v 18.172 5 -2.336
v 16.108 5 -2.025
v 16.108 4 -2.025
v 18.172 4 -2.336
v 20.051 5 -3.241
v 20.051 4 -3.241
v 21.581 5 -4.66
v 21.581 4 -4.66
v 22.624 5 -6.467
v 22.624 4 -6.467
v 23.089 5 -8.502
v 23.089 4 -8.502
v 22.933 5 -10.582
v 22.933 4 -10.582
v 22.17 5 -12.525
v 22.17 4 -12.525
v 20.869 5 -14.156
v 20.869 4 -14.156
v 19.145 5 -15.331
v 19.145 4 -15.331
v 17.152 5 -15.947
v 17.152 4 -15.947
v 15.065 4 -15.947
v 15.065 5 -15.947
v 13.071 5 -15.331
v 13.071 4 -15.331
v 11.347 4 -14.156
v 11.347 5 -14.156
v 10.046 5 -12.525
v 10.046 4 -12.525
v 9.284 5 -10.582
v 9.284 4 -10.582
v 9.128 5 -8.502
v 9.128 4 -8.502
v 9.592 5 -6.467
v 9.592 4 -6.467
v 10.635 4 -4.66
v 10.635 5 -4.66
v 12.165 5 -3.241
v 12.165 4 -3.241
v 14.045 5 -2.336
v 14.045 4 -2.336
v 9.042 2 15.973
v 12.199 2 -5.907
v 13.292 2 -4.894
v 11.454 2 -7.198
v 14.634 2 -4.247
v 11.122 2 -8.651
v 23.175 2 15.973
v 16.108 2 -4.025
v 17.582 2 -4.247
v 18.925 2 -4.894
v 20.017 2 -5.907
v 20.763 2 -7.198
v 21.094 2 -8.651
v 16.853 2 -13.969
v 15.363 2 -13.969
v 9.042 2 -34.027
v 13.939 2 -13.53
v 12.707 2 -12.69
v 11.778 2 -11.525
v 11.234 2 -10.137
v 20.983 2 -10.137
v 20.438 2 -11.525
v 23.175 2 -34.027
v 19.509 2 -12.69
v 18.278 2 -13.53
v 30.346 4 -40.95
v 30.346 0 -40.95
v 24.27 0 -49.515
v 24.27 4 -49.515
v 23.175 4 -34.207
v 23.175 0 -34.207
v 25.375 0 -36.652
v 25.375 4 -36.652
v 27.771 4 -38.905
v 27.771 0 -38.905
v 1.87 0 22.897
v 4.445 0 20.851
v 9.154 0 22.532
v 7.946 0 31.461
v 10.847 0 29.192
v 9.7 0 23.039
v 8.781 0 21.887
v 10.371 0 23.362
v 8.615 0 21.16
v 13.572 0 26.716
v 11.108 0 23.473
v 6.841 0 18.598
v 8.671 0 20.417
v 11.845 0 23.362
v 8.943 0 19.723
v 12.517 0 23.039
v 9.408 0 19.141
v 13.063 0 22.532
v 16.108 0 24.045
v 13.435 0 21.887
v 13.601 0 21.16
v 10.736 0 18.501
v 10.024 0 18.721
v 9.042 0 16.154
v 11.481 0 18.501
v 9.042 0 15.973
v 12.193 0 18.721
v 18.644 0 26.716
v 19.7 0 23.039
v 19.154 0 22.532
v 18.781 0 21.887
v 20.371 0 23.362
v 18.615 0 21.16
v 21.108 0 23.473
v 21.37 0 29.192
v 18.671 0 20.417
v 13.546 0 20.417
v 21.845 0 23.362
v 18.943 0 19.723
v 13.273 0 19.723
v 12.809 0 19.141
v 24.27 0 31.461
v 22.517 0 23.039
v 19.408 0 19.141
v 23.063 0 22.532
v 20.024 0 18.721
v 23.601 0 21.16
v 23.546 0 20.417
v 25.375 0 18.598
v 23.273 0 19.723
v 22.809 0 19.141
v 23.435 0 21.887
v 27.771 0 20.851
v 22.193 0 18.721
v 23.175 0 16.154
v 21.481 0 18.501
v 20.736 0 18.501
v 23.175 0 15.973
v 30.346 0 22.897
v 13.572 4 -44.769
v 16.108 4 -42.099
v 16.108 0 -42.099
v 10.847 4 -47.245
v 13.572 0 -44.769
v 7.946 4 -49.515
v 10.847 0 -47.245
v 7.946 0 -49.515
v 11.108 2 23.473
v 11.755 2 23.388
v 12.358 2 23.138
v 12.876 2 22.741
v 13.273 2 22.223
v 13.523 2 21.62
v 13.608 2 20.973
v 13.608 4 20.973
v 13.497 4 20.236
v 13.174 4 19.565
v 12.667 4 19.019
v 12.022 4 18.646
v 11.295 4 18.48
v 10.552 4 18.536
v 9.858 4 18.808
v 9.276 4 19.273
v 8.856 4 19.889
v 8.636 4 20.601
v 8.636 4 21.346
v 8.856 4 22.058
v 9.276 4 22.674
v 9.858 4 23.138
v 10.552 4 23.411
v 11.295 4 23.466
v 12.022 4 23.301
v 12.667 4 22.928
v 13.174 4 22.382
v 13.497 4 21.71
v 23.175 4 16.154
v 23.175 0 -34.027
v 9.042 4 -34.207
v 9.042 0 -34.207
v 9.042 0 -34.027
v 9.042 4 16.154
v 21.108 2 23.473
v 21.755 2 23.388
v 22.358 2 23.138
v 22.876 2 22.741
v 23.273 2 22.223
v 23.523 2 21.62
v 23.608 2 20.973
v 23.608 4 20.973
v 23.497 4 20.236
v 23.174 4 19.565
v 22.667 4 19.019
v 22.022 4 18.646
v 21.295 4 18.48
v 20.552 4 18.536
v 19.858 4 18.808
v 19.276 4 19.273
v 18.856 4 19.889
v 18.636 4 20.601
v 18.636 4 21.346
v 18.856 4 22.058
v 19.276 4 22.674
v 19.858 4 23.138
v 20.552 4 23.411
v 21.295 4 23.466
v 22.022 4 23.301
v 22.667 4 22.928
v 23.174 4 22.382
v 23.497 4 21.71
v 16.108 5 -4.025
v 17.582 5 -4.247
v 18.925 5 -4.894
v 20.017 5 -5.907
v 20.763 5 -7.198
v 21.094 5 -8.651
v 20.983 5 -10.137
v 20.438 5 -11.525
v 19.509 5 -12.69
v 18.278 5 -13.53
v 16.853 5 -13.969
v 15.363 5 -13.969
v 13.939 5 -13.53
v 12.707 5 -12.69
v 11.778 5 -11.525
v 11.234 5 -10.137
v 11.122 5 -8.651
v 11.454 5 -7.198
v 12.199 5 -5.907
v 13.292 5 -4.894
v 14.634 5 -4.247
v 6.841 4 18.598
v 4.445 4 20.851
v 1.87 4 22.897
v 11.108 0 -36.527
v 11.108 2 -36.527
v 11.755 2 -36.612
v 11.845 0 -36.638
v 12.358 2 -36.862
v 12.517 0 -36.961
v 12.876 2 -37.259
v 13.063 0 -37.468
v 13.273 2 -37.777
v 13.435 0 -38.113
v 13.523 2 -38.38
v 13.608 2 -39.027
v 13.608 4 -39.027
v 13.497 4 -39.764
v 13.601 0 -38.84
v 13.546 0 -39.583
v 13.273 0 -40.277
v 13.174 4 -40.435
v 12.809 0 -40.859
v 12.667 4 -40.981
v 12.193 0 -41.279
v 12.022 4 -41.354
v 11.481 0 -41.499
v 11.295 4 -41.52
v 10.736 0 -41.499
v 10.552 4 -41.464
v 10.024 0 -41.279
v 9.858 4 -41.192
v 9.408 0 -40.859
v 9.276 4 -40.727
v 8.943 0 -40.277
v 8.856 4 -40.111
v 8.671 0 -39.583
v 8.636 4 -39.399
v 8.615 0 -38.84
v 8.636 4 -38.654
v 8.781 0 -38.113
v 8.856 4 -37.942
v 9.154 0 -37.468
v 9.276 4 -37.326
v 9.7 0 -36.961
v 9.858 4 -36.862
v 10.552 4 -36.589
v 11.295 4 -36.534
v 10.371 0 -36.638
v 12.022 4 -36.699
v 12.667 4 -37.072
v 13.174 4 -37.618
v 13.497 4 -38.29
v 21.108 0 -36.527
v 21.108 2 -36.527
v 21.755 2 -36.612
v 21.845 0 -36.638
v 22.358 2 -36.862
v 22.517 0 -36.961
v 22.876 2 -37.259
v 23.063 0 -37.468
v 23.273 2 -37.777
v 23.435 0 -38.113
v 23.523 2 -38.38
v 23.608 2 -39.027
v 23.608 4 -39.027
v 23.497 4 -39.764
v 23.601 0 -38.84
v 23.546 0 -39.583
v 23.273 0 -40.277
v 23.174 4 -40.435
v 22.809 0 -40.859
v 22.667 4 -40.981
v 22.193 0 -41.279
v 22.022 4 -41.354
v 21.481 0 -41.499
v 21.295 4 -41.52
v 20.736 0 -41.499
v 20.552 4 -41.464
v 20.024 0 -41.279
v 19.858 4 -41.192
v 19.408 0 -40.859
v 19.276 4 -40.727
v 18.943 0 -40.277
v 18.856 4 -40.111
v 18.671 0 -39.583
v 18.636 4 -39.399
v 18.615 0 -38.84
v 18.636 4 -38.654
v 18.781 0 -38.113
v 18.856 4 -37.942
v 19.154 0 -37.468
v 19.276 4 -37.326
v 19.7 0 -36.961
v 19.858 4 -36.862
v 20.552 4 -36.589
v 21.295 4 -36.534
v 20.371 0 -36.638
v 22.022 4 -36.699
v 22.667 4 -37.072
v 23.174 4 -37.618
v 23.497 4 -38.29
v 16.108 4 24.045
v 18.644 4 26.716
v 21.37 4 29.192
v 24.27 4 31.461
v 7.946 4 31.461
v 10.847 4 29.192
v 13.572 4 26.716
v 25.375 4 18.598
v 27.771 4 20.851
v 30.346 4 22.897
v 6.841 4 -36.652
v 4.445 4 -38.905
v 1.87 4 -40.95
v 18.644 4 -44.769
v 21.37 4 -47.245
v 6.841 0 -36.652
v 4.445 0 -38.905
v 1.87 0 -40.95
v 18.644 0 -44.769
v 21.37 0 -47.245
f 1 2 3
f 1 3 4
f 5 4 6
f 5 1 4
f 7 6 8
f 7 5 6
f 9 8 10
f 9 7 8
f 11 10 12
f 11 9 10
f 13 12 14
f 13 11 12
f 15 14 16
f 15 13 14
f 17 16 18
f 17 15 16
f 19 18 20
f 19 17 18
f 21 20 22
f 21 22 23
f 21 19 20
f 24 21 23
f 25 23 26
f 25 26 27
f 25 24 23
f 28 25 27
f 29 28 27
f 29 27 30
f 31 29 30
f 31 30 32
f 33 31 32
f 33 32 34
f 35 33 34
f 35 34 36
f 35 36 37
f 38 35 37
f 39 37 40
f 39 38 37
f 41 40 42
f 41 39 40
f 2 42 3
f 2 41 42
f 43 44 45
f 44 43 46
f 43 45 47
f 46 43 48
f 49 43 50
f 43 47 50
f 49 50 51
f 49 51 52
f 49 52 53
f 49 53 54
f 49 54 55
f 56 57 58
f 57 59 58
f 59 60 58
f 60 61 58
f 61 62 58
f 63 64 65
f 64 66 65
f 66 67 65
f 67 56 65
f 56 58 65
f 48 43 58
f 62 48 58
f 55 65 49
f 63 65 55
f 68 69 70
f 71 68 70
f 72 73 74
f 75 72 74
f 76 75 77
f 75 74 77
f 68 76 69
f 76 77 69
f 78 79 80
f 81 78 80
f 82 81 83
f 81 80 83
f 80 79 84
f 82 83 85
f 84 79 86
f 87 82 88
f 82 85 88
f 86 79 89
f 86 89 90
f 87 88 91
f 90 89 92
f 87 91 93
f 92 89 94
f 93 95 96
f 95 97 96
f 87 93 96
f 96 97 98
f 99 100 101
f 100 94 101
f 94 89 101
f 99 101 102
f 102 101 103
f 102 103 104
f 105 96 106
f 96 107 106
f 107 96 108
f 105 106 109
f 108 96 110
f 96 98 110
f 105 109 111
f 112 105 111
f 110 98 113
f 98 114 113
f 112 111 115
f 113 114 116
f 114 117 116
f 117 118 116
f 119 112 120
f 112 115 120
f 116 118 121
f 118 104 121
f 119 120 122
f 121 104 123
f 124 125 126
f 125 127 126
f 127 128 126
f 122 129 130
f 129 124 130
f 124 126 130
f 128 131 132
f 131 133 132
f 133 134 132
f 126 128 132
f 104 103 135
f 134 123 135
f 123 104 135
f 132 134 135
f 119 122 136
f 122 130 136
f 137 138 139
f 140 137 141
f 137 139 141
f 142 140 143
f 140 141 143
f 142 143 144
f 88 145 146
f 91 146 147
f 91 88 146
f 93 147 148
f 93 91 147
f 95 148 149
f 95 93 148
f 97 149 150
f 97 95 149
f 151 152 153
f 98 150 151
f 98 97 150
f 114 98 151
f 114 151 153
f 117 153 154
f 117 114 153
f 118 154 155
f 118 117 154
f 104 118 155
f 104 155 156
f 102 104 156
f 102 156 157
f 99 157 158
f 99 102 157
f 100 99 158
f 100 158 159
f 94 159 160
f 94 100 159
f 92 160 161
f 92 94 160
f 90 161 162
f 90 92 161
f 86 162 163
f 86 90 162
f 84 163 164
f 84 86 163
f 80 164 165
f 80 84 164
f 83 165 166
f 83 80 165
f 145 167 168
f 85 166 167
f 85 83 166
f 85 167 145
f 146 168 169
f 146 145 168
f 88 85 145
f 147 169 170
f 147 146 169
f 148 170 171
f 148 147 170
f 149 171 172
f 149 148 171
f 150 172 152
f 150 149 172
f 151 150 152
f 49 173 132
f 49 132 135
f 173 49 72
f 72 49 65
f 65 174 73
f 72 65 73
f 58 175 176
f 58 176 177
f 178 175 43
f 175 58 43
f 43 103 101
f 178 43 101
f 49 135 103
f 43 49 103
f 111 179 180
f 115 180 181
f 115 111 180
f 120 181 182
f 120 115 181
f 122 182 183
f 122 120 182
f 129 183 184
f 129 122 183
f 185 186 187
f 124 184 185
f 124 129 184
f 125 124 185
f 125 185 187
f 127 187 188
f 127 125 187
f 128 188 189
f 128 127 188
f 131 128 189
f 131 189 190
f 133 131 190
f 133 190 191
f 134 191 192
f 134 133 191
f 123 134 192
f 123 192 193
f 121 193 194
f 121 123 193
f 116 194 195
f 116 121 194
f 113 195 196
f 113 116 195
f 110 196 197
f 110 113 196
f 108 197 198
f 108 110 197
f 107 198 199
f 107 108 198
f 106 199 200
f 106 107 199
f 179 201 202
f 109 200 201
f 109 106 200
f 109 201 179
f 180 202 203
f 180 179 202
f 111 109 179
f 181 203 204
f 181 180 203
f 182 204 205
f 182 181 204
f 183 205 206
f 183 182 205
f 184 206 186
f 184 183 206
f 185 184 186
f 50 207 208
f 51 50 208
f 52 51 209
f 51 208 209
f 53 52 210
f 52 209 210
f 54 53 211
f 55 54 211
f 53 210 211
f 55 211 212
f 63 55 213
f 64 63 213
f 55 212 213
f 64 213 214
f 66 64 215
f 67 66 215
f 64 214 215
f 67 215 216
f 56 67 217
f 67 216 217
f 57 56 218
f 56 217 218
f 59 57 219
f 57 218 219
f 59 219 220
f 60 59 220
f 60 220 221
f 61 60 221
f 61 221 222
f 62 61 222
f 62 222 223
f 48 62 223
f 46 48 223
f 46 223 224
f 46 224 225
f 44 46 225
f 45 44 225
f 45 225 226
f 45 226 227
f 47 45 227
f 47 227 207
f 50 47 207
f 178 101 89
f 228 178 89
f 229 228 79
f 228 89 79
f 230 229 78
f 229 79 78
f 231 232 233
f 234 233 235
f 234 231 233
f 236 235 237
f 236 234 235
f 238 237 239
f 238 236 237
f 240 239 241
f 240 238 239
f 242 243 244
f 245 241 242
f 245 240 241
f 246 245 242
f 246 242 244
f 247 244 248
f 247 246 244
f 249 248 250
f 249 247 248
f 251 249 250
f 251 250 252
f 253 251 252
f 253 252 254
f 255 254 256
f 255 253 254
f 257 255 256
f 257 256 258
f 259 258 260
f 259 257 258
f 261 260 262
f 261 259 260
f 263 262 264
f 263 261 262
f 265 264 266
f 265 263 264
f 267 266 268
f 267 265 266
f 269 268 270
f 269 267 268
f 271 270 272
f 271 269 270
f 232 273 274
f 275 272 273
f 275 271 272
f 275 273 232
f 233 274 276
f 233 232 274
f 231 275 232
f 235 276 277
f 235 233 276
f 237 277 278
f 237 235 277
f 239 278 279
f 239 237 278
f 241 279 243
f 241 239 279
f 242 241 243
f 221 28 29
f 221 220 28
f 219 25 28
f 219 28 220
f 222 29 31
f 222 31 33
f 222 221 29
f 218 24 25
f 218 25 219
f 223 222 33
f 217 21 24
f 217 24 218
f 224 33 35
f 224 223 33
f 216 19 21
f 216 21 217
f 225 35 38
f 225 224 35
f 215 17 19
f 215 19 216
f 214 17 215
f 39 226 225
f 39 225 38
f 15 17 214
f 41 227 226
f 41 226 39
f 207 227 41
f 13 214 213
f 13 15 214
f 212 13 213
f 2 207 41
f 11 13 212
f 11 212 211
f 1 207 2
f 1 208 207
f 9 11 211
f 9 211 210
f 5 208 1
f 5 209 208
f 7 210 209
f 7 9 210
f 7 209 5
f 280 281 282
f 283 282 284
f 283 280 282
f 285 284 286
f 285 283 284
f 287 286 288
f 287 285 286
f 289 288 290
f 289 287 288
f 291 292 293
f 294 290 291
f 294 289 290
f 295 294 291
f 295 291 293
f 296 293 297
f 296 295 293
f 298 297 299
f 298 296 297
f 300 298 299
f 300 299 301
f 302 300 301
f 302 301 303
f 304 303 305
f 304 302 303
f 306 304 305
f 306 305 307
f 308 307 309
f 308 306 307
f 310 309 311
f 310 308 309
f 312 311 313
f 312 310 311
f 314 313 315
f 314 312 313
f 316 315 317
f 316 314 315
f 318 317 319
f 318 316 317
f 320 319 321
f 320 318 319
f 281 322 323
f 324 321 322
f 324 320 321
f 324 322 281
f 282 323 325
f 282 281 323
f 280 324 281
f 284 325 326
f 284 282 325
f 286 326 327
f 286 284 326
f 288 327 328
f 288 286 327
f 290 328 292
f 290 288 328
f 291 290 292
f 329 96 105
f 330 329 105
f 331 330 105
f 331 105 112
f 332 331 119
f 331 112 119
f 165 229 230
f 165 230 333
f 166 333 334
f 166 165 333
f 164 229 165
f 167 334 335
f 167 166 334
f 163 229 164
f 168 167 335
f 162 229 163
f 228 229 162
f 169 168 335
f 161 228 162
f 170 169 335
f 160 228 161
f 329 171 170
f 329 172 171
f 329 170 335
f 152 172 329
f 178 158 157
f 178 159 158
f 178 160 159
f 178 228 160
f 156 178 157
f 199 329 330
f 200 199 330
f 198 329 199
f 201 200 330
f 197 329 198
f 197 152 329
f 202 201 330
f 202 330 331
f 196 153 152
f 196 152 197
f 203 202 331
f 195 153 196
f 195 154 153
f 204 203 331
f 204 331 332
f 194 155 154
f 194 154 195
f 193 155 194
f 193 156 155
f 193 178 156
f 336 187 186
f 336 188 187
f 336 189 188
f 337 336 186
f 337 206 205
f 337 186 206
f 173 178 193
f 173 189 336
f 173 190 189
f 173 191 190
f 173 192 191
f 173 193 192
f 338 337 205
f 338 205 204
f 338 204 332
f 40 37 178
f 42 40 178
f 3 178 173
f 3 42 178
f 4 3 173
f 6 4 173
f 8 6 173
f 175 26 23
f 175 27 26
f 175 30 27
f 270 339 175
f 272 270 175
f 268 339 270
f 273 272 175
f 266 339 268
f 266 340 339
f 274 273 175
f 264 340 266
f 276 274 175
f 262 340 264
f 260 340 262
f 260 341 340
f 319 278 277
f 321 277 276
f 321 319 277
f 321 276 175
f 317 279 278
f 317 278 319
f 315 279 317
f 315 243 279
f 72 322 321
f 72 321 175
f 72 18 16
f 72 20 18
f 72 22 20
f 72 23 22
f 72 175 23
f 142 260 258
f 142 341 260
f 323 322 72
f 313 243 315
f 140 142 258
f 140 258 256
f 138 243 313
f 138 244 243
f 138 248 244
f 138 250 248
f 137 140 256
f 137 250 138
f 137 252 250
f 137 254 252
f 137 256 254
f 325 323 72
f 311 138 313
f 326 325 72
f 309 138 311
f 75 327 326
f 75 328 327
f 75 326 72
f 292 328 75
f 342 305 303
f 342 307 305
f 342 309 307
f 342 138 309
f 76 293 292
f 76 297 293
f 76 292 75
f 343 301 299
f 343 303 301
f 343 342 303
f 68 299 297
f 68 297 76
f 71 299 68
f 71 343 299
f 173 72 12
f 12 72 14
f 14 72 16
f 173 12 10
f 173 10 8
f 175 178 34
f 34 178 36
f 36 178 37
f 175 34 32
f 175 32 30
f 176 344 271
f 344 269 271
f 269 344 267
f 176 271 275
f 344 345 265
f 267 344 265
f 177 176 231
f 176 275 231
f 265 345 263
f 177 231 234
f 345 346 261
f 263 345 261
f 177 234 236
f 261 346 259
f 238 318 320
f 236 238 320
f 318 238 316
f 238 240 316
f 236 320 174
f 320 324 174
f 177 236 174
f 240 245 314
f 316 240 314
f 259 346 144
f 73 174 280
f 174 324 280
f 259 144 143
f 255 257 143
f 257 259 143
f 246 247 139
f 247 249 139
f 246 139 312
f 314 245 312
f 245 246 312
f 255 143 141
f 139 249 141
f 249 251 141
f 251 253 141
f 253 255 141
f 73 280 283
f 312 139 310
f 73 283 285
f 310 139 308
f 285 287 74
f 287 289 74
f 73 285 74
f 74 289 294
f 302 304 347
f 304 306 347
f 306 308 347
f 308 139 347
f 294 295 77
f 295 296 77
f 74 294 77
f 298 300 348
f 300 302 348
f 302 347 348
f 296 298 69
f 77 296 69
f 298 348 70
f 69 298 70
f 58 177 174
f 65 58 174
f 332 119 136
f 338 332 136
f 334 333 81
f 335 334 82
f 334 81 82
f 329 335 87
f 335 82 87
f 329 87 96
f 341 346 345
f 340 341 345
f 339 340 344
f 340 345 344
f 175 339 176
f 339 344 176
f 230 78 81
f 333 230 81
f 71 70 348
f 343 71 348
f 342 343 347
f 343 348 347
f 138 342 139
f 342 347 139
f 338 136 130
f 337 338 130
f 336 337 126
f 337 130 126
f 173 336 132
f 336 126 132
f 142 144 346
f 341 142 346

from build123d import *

# Parameters (mm, degrees)
SKETCH1_R               = 2.5
BOSS_EXTRUDE1_DEPTH     = 2
BOSS_EXTRUDE1_2_DEPTH   = 2
BOSS_EXTRUDE3_OUTLINE_R = 2.5
BOSS_EXTRUDE3_DEPTH     = 2
SKETCH6_R               = 5
CUT_EXTRUDE1_DEPTH      = 4
CUT_EXTRUDE2_START      = -10
CUT_EXTRUDE2_DEPTH      = 10
BOSS_EXTRUDE4_START     = 1
SKETCH8_R               = 7
SKETCH8_R_2             = 5
BOSS_EXTRUDE4_DEPTH     = 1


# Read off the part's stored shape, not the designer's step: Boss-Extrude3
with BuildPart() as part:
    # Sketch1 → Boss-Extrude1 (new body)
    with BuildSketch(Plane(origin=(0, 0, 0), x_dir=(1, 0, 0), z_dir=(0, 1, 0))):
        with BuildLine():
            ThreePointArc((23.674984177, 34.026642345), (27.138423224, 37.66837111), (31.041417883, 40.83447773))
            Line((31.041417883, 40.83447773), (24.387097577, 50.213711241))
            ThreePointArc((24.387097577, 50.213711241), (20.045094669, 46.759453741), (16.108243271, 42.849711395))
            ThreePointArc((16.108243271, 42.849711395), (12.171391874, 46.759453741), (7.829388966, 50.213711241))
            Line((7.829388966, 50.213711241), (1.175068659, 40.83447773))
            ThreePointArc((1.175068659, 40.83447773), (5.078063318, 37.66837111), (8.541502365, 34.026642345))
            Line((8.541502365, 34.026642345), (23.674984177, 34.026642345))
        make_face()
        with Locations(Location((11.108243271, 39.026642345, 0), (0, 0, 270))):
            Circle(SKETCH1_R, mode=Mode.SUBTRACT)
        with Locations(Location((21.108243271, 39.026642345, 0), (0, 0, 270))):
            Circle(SKETCH1_R, mode=Mode.SUBTRACT)
    extrude(amount=BOSS_EXTRUDE1_DEPTH)



with BuildPart() as body_2:
    # Sketch1 → Boss-Extrude1 2 (new body)
    with BuildSketch(Plane(origin=(0, 0, 0), x_dir=(1, 0, 0), z_dir=(0, 1, 0))):
        with BuildLine():
            Line((24.387097577, -32.160426552), (31.041417883, -22.781193041))
            ThreePointArc((31.041417883, -22.781193041), (27.138423224, -19.615086421), (23.674984177, -15.973357655))
            Line((23.674984177, -15.973357655), (8.541502365, -15.973357655))
            ThreePointArc((8.541502365, -15.973357655), (5.078063318, -19.615086421), (1.175068659, -22.781193041))
            Line((1.175068659, -22.781193041), (7.829388966, -32.160426552))
            ThreePointArc((7.829388966, -32.160426552), (12.171391874, -28.706169052), (16.108243271, -24.796426706))
            ThreePointArc((16.108243271, -24.796426706), (20.045094669, -28.706169052), (24.387097577, -32.160426552))
        make_face()
        with Locations(Location((11.108243271, -20.973357655, 0), (0, 0, 270))):
            Circle(SKETCH1_R, mode=Mode.SUBTRACT)
        with Locations(Location((21.108243271, -20.973357655, 0), (0, 0, 270))):
            Circle(SKETCH1_R, mode=Mode.SUBTRACT)
    extrude(amount=BOSS_EXTRUDE1_2_DEPTH)


with BuildPart() as part_1:
    add(part.part)

    add(body_2.part)  # Boss-Extrude3 merges body 2
    # Boss-Extrude3 outline → Boss-Extrude3 (add)
    with BuildSketch(Plane(origin=(0, 2, 0), x_dir=(1, 0, 0), z_dir=(0, 1, 0))):
        with BuildLine():
            ThreePointArc((16.108243271, 42.849711395), (12.171391874, 46.759453741), (7.829388966, 50.213711241))
            Line((7.829388966, 50.213711241), (1.175068659, 40.83447773))
            ThreePointArc((1.175068659, 40.83447773), (5.078063318, 37.66837111), (8.541502365, 34.026642345))
            Line((8.541502365, 34.026642345), (8.541502365, -15.973357655))
            ThreePointArc((8.541502365, -15.973357655), (5.078063318, -19.615086421), (1.175068659, -22.781193041))
            Line((1.175068659, -22.781193041), (7.829388966, -32.160426552))
            ThreePointArc((7.829388966, -32.160426552), (12.171391874, -28.706169052), (16.108243271, -24.796426706))
            ThreePointArc((16.108243271, -24.796426706), (20.045094669, -28.706169052), (24.387097577, -32.160426552))
            Line((24.387097577, -32.160426552), (31.041417883, -22.781193041))
            ThreePointArc((31.041417883, -22.781193041), (27.138423224, -19.615086421), (23.674984177, -15.973357655))
            Line((23.674984177, -15.973357655), (23.674984177, 34.026642345))
            ThreePointArc((23.674984177, 34.026642345), (27.138423224, 37.66837111), (31.041417883, 40.83447773))
            Line((31.041417883, 40.83447773), (24.387097577, 50.213711241))
            ThreePointArc((24.387097577, 50.213711241), (20.045094669, 46.759453741), (16.108243271, 42.849711395))
        make_face()
        with Locations((11.108243271, -20.973357655)):
            Circle(BOSS_EXTRUDE3_OUTLINE_R, mode=Mode.SUBTRACT)
        with Locations((21.108243271, -20.973357655)):
            Circle(BOSS_EXTRUDE3_OUTLINE_R, mode=Mode.SUBTRACT)
        with Locations((11.108243271, 39.026642345)):
            Circle(BOSS_EXTRUDE3_OUTLINE_R, mode=Mode.SUBTRACT)
        with Locations((21.108243271, 39.026642345)):
            Circle(BOSS_EXTRUDE3_OUTLINE_R, mode=Mode.SUBTRACT)
    extrude(amount=BOSS_EXTRUDE3_DEPTH)

    # Sketch6 → Cut-Extrude1 (cut)
    with BuildSketch(Plane(origin=(0, 4, 0), x_dir=(1, 0, 0), z_dir=(0, 1, 0))):
        with Locations(Location((16.108243271, 9.024711395, 0), (0, 0, 270))):
            Circle(SKETCH6_R)
    extrude(amount=-CUT_EXTRUDE1_DEPTH, mode=Mode.SUBTRACT)

    # Sketch7 → Cut-Extrude2 (cut)
    with BuildSketch(Plane(origin=(0, 4, 0), x_dir=(1, 0, 0), z_dir=(0, 1, 0)).offset(CUT_EXTRUDE2_START)):
        with BuildLine():
            Line((1.175068659, -22.781193041), (7.829388966, -32.160426552))
            ThreePointArc((7.829388966, -32.160426552), (12.171391874, -28.706169052), (16.108243271, -24.796426706))
            ThreePointArc((16.108243271, -24.796426706), (20.045094669, -28.706169052), (24.387097577, -32.160426552))
            Line((24.387097577, -32.160426552), (31.041417883, -22.781193041))
            ThreePointArc((31.041417883, -22.781193041), (27.138423224, -19.615086421), (23.674984177, -15.973357655))
            Line((23.674984177, -15.973357655), (23.674984177, 34.026642345))
            ThreePointArc((23.674984177, 34.026642345), (27.138423224, 37.66837111), (31.041417883, 40.83447773))
            Line((31.041417883, 40.83447773), (24.387097577, 50.213711241))
            ThreePointArc((24.387097577, 50.213711241), (20.045094669, 46.759453741), (16.108243271, 42.849711395))
            ThreePointArc((16.108243271, 42.849711395), (12.171391874, 46.759453741), (7.829388966, 50.213711241))
            Line((7.829388966, 50.213711241), (1.175068659, 40.83447773))
            ThreePointArc((1.175068659, 40.83447773), (5.078063318, 37.66837111), (8.541502365, 34.026642345))
            Line((8.541502365, 34.026642345), (8.541502365, -15.973357655))
            ThreePointArc((8.541502365, -15.973357655), (5.078063318, -19.615086421), (1.175068659, -22.781193041))
        make_face()
        with BuildLine():
            Line((1.870348493, -22.897086458), (7.946416825, -31.461276502))
            ThreePointArc((7.946416825, -31.461276502), (12.232412061, -27.97896903), (16.108243271, -24.045249044))
            ThreePointArc((16.108243271, -24.045249044), (19.984074481, -27.97896903), (24.270069717, -31.461276502))
            Line((24.270069717, -31.461276502), (30.34613805, -22.897086458))
            ThreePointArc((30.34613805, -22.897086458), (26.549691802, -19.749820127), (23.174984177, -16.154039555))
            Line((23.174984177, -16.154039555), (23.174984177, 34.207324244))
            ThreePointArc((23.174984177, 34.207324244), (26.549691802, 37.803104816), (30.34613805, 40.950371147))
            Line((30.34613805, 40.950371147), (24.270069717, 49.514561191))
            ThreePointArc((24.270069717, 49.514561191), (19.984074481, 46.032253719), (16.108243271, 42.098533733))
            ThreePointArc((16.108243271, 42.098533733), (12.232412061, 46.032253719), (7.946416825, 49.514561191))
            Line((7.946416825, 49.514561191), (1.870348493, 40.950371147))
            ThreePointArc((1.870348493, 40.950371147), (5.666794741, 37.803104816), (9.041502365, 34.207324244))
            Line((9.041502365, 34.207324244), (9.041502365, -16.154039555))
            ThreePointArc((9.041502365, -16.154039555), (5.666794741, -19.749820127), (1.870348493, -22.897086458))
        make_face(mode=Mode.SUBTRACT)
    extrude(amount=CUT_EXTRUDE2_DEPTH, mode=Mode.SUBTRACT)

    # Sketch8 → Boss-Extrude4 (add)
    with BuildSketch(Plane(origin=(0, 4, 0), x_dir=(1, 0, 0), z_dir=(0, 1, 0)).offset(BOSS_EXTRUDE4_START)):
        with Locations(Location((16.108243271, 9.024711395, 0), (0, 0, 270))):
            Circle(SKETCH8_R)
        with Locations(Location((16.108243271, 9.024711395, 0), (0, 0, 270))):
            Circle(SKETCH8_R_2, mode=Mode.SUBTRACT)
    extrude(amount=-BOSS_EXTRUDE4_DEPTH)


solid = part_1.part
